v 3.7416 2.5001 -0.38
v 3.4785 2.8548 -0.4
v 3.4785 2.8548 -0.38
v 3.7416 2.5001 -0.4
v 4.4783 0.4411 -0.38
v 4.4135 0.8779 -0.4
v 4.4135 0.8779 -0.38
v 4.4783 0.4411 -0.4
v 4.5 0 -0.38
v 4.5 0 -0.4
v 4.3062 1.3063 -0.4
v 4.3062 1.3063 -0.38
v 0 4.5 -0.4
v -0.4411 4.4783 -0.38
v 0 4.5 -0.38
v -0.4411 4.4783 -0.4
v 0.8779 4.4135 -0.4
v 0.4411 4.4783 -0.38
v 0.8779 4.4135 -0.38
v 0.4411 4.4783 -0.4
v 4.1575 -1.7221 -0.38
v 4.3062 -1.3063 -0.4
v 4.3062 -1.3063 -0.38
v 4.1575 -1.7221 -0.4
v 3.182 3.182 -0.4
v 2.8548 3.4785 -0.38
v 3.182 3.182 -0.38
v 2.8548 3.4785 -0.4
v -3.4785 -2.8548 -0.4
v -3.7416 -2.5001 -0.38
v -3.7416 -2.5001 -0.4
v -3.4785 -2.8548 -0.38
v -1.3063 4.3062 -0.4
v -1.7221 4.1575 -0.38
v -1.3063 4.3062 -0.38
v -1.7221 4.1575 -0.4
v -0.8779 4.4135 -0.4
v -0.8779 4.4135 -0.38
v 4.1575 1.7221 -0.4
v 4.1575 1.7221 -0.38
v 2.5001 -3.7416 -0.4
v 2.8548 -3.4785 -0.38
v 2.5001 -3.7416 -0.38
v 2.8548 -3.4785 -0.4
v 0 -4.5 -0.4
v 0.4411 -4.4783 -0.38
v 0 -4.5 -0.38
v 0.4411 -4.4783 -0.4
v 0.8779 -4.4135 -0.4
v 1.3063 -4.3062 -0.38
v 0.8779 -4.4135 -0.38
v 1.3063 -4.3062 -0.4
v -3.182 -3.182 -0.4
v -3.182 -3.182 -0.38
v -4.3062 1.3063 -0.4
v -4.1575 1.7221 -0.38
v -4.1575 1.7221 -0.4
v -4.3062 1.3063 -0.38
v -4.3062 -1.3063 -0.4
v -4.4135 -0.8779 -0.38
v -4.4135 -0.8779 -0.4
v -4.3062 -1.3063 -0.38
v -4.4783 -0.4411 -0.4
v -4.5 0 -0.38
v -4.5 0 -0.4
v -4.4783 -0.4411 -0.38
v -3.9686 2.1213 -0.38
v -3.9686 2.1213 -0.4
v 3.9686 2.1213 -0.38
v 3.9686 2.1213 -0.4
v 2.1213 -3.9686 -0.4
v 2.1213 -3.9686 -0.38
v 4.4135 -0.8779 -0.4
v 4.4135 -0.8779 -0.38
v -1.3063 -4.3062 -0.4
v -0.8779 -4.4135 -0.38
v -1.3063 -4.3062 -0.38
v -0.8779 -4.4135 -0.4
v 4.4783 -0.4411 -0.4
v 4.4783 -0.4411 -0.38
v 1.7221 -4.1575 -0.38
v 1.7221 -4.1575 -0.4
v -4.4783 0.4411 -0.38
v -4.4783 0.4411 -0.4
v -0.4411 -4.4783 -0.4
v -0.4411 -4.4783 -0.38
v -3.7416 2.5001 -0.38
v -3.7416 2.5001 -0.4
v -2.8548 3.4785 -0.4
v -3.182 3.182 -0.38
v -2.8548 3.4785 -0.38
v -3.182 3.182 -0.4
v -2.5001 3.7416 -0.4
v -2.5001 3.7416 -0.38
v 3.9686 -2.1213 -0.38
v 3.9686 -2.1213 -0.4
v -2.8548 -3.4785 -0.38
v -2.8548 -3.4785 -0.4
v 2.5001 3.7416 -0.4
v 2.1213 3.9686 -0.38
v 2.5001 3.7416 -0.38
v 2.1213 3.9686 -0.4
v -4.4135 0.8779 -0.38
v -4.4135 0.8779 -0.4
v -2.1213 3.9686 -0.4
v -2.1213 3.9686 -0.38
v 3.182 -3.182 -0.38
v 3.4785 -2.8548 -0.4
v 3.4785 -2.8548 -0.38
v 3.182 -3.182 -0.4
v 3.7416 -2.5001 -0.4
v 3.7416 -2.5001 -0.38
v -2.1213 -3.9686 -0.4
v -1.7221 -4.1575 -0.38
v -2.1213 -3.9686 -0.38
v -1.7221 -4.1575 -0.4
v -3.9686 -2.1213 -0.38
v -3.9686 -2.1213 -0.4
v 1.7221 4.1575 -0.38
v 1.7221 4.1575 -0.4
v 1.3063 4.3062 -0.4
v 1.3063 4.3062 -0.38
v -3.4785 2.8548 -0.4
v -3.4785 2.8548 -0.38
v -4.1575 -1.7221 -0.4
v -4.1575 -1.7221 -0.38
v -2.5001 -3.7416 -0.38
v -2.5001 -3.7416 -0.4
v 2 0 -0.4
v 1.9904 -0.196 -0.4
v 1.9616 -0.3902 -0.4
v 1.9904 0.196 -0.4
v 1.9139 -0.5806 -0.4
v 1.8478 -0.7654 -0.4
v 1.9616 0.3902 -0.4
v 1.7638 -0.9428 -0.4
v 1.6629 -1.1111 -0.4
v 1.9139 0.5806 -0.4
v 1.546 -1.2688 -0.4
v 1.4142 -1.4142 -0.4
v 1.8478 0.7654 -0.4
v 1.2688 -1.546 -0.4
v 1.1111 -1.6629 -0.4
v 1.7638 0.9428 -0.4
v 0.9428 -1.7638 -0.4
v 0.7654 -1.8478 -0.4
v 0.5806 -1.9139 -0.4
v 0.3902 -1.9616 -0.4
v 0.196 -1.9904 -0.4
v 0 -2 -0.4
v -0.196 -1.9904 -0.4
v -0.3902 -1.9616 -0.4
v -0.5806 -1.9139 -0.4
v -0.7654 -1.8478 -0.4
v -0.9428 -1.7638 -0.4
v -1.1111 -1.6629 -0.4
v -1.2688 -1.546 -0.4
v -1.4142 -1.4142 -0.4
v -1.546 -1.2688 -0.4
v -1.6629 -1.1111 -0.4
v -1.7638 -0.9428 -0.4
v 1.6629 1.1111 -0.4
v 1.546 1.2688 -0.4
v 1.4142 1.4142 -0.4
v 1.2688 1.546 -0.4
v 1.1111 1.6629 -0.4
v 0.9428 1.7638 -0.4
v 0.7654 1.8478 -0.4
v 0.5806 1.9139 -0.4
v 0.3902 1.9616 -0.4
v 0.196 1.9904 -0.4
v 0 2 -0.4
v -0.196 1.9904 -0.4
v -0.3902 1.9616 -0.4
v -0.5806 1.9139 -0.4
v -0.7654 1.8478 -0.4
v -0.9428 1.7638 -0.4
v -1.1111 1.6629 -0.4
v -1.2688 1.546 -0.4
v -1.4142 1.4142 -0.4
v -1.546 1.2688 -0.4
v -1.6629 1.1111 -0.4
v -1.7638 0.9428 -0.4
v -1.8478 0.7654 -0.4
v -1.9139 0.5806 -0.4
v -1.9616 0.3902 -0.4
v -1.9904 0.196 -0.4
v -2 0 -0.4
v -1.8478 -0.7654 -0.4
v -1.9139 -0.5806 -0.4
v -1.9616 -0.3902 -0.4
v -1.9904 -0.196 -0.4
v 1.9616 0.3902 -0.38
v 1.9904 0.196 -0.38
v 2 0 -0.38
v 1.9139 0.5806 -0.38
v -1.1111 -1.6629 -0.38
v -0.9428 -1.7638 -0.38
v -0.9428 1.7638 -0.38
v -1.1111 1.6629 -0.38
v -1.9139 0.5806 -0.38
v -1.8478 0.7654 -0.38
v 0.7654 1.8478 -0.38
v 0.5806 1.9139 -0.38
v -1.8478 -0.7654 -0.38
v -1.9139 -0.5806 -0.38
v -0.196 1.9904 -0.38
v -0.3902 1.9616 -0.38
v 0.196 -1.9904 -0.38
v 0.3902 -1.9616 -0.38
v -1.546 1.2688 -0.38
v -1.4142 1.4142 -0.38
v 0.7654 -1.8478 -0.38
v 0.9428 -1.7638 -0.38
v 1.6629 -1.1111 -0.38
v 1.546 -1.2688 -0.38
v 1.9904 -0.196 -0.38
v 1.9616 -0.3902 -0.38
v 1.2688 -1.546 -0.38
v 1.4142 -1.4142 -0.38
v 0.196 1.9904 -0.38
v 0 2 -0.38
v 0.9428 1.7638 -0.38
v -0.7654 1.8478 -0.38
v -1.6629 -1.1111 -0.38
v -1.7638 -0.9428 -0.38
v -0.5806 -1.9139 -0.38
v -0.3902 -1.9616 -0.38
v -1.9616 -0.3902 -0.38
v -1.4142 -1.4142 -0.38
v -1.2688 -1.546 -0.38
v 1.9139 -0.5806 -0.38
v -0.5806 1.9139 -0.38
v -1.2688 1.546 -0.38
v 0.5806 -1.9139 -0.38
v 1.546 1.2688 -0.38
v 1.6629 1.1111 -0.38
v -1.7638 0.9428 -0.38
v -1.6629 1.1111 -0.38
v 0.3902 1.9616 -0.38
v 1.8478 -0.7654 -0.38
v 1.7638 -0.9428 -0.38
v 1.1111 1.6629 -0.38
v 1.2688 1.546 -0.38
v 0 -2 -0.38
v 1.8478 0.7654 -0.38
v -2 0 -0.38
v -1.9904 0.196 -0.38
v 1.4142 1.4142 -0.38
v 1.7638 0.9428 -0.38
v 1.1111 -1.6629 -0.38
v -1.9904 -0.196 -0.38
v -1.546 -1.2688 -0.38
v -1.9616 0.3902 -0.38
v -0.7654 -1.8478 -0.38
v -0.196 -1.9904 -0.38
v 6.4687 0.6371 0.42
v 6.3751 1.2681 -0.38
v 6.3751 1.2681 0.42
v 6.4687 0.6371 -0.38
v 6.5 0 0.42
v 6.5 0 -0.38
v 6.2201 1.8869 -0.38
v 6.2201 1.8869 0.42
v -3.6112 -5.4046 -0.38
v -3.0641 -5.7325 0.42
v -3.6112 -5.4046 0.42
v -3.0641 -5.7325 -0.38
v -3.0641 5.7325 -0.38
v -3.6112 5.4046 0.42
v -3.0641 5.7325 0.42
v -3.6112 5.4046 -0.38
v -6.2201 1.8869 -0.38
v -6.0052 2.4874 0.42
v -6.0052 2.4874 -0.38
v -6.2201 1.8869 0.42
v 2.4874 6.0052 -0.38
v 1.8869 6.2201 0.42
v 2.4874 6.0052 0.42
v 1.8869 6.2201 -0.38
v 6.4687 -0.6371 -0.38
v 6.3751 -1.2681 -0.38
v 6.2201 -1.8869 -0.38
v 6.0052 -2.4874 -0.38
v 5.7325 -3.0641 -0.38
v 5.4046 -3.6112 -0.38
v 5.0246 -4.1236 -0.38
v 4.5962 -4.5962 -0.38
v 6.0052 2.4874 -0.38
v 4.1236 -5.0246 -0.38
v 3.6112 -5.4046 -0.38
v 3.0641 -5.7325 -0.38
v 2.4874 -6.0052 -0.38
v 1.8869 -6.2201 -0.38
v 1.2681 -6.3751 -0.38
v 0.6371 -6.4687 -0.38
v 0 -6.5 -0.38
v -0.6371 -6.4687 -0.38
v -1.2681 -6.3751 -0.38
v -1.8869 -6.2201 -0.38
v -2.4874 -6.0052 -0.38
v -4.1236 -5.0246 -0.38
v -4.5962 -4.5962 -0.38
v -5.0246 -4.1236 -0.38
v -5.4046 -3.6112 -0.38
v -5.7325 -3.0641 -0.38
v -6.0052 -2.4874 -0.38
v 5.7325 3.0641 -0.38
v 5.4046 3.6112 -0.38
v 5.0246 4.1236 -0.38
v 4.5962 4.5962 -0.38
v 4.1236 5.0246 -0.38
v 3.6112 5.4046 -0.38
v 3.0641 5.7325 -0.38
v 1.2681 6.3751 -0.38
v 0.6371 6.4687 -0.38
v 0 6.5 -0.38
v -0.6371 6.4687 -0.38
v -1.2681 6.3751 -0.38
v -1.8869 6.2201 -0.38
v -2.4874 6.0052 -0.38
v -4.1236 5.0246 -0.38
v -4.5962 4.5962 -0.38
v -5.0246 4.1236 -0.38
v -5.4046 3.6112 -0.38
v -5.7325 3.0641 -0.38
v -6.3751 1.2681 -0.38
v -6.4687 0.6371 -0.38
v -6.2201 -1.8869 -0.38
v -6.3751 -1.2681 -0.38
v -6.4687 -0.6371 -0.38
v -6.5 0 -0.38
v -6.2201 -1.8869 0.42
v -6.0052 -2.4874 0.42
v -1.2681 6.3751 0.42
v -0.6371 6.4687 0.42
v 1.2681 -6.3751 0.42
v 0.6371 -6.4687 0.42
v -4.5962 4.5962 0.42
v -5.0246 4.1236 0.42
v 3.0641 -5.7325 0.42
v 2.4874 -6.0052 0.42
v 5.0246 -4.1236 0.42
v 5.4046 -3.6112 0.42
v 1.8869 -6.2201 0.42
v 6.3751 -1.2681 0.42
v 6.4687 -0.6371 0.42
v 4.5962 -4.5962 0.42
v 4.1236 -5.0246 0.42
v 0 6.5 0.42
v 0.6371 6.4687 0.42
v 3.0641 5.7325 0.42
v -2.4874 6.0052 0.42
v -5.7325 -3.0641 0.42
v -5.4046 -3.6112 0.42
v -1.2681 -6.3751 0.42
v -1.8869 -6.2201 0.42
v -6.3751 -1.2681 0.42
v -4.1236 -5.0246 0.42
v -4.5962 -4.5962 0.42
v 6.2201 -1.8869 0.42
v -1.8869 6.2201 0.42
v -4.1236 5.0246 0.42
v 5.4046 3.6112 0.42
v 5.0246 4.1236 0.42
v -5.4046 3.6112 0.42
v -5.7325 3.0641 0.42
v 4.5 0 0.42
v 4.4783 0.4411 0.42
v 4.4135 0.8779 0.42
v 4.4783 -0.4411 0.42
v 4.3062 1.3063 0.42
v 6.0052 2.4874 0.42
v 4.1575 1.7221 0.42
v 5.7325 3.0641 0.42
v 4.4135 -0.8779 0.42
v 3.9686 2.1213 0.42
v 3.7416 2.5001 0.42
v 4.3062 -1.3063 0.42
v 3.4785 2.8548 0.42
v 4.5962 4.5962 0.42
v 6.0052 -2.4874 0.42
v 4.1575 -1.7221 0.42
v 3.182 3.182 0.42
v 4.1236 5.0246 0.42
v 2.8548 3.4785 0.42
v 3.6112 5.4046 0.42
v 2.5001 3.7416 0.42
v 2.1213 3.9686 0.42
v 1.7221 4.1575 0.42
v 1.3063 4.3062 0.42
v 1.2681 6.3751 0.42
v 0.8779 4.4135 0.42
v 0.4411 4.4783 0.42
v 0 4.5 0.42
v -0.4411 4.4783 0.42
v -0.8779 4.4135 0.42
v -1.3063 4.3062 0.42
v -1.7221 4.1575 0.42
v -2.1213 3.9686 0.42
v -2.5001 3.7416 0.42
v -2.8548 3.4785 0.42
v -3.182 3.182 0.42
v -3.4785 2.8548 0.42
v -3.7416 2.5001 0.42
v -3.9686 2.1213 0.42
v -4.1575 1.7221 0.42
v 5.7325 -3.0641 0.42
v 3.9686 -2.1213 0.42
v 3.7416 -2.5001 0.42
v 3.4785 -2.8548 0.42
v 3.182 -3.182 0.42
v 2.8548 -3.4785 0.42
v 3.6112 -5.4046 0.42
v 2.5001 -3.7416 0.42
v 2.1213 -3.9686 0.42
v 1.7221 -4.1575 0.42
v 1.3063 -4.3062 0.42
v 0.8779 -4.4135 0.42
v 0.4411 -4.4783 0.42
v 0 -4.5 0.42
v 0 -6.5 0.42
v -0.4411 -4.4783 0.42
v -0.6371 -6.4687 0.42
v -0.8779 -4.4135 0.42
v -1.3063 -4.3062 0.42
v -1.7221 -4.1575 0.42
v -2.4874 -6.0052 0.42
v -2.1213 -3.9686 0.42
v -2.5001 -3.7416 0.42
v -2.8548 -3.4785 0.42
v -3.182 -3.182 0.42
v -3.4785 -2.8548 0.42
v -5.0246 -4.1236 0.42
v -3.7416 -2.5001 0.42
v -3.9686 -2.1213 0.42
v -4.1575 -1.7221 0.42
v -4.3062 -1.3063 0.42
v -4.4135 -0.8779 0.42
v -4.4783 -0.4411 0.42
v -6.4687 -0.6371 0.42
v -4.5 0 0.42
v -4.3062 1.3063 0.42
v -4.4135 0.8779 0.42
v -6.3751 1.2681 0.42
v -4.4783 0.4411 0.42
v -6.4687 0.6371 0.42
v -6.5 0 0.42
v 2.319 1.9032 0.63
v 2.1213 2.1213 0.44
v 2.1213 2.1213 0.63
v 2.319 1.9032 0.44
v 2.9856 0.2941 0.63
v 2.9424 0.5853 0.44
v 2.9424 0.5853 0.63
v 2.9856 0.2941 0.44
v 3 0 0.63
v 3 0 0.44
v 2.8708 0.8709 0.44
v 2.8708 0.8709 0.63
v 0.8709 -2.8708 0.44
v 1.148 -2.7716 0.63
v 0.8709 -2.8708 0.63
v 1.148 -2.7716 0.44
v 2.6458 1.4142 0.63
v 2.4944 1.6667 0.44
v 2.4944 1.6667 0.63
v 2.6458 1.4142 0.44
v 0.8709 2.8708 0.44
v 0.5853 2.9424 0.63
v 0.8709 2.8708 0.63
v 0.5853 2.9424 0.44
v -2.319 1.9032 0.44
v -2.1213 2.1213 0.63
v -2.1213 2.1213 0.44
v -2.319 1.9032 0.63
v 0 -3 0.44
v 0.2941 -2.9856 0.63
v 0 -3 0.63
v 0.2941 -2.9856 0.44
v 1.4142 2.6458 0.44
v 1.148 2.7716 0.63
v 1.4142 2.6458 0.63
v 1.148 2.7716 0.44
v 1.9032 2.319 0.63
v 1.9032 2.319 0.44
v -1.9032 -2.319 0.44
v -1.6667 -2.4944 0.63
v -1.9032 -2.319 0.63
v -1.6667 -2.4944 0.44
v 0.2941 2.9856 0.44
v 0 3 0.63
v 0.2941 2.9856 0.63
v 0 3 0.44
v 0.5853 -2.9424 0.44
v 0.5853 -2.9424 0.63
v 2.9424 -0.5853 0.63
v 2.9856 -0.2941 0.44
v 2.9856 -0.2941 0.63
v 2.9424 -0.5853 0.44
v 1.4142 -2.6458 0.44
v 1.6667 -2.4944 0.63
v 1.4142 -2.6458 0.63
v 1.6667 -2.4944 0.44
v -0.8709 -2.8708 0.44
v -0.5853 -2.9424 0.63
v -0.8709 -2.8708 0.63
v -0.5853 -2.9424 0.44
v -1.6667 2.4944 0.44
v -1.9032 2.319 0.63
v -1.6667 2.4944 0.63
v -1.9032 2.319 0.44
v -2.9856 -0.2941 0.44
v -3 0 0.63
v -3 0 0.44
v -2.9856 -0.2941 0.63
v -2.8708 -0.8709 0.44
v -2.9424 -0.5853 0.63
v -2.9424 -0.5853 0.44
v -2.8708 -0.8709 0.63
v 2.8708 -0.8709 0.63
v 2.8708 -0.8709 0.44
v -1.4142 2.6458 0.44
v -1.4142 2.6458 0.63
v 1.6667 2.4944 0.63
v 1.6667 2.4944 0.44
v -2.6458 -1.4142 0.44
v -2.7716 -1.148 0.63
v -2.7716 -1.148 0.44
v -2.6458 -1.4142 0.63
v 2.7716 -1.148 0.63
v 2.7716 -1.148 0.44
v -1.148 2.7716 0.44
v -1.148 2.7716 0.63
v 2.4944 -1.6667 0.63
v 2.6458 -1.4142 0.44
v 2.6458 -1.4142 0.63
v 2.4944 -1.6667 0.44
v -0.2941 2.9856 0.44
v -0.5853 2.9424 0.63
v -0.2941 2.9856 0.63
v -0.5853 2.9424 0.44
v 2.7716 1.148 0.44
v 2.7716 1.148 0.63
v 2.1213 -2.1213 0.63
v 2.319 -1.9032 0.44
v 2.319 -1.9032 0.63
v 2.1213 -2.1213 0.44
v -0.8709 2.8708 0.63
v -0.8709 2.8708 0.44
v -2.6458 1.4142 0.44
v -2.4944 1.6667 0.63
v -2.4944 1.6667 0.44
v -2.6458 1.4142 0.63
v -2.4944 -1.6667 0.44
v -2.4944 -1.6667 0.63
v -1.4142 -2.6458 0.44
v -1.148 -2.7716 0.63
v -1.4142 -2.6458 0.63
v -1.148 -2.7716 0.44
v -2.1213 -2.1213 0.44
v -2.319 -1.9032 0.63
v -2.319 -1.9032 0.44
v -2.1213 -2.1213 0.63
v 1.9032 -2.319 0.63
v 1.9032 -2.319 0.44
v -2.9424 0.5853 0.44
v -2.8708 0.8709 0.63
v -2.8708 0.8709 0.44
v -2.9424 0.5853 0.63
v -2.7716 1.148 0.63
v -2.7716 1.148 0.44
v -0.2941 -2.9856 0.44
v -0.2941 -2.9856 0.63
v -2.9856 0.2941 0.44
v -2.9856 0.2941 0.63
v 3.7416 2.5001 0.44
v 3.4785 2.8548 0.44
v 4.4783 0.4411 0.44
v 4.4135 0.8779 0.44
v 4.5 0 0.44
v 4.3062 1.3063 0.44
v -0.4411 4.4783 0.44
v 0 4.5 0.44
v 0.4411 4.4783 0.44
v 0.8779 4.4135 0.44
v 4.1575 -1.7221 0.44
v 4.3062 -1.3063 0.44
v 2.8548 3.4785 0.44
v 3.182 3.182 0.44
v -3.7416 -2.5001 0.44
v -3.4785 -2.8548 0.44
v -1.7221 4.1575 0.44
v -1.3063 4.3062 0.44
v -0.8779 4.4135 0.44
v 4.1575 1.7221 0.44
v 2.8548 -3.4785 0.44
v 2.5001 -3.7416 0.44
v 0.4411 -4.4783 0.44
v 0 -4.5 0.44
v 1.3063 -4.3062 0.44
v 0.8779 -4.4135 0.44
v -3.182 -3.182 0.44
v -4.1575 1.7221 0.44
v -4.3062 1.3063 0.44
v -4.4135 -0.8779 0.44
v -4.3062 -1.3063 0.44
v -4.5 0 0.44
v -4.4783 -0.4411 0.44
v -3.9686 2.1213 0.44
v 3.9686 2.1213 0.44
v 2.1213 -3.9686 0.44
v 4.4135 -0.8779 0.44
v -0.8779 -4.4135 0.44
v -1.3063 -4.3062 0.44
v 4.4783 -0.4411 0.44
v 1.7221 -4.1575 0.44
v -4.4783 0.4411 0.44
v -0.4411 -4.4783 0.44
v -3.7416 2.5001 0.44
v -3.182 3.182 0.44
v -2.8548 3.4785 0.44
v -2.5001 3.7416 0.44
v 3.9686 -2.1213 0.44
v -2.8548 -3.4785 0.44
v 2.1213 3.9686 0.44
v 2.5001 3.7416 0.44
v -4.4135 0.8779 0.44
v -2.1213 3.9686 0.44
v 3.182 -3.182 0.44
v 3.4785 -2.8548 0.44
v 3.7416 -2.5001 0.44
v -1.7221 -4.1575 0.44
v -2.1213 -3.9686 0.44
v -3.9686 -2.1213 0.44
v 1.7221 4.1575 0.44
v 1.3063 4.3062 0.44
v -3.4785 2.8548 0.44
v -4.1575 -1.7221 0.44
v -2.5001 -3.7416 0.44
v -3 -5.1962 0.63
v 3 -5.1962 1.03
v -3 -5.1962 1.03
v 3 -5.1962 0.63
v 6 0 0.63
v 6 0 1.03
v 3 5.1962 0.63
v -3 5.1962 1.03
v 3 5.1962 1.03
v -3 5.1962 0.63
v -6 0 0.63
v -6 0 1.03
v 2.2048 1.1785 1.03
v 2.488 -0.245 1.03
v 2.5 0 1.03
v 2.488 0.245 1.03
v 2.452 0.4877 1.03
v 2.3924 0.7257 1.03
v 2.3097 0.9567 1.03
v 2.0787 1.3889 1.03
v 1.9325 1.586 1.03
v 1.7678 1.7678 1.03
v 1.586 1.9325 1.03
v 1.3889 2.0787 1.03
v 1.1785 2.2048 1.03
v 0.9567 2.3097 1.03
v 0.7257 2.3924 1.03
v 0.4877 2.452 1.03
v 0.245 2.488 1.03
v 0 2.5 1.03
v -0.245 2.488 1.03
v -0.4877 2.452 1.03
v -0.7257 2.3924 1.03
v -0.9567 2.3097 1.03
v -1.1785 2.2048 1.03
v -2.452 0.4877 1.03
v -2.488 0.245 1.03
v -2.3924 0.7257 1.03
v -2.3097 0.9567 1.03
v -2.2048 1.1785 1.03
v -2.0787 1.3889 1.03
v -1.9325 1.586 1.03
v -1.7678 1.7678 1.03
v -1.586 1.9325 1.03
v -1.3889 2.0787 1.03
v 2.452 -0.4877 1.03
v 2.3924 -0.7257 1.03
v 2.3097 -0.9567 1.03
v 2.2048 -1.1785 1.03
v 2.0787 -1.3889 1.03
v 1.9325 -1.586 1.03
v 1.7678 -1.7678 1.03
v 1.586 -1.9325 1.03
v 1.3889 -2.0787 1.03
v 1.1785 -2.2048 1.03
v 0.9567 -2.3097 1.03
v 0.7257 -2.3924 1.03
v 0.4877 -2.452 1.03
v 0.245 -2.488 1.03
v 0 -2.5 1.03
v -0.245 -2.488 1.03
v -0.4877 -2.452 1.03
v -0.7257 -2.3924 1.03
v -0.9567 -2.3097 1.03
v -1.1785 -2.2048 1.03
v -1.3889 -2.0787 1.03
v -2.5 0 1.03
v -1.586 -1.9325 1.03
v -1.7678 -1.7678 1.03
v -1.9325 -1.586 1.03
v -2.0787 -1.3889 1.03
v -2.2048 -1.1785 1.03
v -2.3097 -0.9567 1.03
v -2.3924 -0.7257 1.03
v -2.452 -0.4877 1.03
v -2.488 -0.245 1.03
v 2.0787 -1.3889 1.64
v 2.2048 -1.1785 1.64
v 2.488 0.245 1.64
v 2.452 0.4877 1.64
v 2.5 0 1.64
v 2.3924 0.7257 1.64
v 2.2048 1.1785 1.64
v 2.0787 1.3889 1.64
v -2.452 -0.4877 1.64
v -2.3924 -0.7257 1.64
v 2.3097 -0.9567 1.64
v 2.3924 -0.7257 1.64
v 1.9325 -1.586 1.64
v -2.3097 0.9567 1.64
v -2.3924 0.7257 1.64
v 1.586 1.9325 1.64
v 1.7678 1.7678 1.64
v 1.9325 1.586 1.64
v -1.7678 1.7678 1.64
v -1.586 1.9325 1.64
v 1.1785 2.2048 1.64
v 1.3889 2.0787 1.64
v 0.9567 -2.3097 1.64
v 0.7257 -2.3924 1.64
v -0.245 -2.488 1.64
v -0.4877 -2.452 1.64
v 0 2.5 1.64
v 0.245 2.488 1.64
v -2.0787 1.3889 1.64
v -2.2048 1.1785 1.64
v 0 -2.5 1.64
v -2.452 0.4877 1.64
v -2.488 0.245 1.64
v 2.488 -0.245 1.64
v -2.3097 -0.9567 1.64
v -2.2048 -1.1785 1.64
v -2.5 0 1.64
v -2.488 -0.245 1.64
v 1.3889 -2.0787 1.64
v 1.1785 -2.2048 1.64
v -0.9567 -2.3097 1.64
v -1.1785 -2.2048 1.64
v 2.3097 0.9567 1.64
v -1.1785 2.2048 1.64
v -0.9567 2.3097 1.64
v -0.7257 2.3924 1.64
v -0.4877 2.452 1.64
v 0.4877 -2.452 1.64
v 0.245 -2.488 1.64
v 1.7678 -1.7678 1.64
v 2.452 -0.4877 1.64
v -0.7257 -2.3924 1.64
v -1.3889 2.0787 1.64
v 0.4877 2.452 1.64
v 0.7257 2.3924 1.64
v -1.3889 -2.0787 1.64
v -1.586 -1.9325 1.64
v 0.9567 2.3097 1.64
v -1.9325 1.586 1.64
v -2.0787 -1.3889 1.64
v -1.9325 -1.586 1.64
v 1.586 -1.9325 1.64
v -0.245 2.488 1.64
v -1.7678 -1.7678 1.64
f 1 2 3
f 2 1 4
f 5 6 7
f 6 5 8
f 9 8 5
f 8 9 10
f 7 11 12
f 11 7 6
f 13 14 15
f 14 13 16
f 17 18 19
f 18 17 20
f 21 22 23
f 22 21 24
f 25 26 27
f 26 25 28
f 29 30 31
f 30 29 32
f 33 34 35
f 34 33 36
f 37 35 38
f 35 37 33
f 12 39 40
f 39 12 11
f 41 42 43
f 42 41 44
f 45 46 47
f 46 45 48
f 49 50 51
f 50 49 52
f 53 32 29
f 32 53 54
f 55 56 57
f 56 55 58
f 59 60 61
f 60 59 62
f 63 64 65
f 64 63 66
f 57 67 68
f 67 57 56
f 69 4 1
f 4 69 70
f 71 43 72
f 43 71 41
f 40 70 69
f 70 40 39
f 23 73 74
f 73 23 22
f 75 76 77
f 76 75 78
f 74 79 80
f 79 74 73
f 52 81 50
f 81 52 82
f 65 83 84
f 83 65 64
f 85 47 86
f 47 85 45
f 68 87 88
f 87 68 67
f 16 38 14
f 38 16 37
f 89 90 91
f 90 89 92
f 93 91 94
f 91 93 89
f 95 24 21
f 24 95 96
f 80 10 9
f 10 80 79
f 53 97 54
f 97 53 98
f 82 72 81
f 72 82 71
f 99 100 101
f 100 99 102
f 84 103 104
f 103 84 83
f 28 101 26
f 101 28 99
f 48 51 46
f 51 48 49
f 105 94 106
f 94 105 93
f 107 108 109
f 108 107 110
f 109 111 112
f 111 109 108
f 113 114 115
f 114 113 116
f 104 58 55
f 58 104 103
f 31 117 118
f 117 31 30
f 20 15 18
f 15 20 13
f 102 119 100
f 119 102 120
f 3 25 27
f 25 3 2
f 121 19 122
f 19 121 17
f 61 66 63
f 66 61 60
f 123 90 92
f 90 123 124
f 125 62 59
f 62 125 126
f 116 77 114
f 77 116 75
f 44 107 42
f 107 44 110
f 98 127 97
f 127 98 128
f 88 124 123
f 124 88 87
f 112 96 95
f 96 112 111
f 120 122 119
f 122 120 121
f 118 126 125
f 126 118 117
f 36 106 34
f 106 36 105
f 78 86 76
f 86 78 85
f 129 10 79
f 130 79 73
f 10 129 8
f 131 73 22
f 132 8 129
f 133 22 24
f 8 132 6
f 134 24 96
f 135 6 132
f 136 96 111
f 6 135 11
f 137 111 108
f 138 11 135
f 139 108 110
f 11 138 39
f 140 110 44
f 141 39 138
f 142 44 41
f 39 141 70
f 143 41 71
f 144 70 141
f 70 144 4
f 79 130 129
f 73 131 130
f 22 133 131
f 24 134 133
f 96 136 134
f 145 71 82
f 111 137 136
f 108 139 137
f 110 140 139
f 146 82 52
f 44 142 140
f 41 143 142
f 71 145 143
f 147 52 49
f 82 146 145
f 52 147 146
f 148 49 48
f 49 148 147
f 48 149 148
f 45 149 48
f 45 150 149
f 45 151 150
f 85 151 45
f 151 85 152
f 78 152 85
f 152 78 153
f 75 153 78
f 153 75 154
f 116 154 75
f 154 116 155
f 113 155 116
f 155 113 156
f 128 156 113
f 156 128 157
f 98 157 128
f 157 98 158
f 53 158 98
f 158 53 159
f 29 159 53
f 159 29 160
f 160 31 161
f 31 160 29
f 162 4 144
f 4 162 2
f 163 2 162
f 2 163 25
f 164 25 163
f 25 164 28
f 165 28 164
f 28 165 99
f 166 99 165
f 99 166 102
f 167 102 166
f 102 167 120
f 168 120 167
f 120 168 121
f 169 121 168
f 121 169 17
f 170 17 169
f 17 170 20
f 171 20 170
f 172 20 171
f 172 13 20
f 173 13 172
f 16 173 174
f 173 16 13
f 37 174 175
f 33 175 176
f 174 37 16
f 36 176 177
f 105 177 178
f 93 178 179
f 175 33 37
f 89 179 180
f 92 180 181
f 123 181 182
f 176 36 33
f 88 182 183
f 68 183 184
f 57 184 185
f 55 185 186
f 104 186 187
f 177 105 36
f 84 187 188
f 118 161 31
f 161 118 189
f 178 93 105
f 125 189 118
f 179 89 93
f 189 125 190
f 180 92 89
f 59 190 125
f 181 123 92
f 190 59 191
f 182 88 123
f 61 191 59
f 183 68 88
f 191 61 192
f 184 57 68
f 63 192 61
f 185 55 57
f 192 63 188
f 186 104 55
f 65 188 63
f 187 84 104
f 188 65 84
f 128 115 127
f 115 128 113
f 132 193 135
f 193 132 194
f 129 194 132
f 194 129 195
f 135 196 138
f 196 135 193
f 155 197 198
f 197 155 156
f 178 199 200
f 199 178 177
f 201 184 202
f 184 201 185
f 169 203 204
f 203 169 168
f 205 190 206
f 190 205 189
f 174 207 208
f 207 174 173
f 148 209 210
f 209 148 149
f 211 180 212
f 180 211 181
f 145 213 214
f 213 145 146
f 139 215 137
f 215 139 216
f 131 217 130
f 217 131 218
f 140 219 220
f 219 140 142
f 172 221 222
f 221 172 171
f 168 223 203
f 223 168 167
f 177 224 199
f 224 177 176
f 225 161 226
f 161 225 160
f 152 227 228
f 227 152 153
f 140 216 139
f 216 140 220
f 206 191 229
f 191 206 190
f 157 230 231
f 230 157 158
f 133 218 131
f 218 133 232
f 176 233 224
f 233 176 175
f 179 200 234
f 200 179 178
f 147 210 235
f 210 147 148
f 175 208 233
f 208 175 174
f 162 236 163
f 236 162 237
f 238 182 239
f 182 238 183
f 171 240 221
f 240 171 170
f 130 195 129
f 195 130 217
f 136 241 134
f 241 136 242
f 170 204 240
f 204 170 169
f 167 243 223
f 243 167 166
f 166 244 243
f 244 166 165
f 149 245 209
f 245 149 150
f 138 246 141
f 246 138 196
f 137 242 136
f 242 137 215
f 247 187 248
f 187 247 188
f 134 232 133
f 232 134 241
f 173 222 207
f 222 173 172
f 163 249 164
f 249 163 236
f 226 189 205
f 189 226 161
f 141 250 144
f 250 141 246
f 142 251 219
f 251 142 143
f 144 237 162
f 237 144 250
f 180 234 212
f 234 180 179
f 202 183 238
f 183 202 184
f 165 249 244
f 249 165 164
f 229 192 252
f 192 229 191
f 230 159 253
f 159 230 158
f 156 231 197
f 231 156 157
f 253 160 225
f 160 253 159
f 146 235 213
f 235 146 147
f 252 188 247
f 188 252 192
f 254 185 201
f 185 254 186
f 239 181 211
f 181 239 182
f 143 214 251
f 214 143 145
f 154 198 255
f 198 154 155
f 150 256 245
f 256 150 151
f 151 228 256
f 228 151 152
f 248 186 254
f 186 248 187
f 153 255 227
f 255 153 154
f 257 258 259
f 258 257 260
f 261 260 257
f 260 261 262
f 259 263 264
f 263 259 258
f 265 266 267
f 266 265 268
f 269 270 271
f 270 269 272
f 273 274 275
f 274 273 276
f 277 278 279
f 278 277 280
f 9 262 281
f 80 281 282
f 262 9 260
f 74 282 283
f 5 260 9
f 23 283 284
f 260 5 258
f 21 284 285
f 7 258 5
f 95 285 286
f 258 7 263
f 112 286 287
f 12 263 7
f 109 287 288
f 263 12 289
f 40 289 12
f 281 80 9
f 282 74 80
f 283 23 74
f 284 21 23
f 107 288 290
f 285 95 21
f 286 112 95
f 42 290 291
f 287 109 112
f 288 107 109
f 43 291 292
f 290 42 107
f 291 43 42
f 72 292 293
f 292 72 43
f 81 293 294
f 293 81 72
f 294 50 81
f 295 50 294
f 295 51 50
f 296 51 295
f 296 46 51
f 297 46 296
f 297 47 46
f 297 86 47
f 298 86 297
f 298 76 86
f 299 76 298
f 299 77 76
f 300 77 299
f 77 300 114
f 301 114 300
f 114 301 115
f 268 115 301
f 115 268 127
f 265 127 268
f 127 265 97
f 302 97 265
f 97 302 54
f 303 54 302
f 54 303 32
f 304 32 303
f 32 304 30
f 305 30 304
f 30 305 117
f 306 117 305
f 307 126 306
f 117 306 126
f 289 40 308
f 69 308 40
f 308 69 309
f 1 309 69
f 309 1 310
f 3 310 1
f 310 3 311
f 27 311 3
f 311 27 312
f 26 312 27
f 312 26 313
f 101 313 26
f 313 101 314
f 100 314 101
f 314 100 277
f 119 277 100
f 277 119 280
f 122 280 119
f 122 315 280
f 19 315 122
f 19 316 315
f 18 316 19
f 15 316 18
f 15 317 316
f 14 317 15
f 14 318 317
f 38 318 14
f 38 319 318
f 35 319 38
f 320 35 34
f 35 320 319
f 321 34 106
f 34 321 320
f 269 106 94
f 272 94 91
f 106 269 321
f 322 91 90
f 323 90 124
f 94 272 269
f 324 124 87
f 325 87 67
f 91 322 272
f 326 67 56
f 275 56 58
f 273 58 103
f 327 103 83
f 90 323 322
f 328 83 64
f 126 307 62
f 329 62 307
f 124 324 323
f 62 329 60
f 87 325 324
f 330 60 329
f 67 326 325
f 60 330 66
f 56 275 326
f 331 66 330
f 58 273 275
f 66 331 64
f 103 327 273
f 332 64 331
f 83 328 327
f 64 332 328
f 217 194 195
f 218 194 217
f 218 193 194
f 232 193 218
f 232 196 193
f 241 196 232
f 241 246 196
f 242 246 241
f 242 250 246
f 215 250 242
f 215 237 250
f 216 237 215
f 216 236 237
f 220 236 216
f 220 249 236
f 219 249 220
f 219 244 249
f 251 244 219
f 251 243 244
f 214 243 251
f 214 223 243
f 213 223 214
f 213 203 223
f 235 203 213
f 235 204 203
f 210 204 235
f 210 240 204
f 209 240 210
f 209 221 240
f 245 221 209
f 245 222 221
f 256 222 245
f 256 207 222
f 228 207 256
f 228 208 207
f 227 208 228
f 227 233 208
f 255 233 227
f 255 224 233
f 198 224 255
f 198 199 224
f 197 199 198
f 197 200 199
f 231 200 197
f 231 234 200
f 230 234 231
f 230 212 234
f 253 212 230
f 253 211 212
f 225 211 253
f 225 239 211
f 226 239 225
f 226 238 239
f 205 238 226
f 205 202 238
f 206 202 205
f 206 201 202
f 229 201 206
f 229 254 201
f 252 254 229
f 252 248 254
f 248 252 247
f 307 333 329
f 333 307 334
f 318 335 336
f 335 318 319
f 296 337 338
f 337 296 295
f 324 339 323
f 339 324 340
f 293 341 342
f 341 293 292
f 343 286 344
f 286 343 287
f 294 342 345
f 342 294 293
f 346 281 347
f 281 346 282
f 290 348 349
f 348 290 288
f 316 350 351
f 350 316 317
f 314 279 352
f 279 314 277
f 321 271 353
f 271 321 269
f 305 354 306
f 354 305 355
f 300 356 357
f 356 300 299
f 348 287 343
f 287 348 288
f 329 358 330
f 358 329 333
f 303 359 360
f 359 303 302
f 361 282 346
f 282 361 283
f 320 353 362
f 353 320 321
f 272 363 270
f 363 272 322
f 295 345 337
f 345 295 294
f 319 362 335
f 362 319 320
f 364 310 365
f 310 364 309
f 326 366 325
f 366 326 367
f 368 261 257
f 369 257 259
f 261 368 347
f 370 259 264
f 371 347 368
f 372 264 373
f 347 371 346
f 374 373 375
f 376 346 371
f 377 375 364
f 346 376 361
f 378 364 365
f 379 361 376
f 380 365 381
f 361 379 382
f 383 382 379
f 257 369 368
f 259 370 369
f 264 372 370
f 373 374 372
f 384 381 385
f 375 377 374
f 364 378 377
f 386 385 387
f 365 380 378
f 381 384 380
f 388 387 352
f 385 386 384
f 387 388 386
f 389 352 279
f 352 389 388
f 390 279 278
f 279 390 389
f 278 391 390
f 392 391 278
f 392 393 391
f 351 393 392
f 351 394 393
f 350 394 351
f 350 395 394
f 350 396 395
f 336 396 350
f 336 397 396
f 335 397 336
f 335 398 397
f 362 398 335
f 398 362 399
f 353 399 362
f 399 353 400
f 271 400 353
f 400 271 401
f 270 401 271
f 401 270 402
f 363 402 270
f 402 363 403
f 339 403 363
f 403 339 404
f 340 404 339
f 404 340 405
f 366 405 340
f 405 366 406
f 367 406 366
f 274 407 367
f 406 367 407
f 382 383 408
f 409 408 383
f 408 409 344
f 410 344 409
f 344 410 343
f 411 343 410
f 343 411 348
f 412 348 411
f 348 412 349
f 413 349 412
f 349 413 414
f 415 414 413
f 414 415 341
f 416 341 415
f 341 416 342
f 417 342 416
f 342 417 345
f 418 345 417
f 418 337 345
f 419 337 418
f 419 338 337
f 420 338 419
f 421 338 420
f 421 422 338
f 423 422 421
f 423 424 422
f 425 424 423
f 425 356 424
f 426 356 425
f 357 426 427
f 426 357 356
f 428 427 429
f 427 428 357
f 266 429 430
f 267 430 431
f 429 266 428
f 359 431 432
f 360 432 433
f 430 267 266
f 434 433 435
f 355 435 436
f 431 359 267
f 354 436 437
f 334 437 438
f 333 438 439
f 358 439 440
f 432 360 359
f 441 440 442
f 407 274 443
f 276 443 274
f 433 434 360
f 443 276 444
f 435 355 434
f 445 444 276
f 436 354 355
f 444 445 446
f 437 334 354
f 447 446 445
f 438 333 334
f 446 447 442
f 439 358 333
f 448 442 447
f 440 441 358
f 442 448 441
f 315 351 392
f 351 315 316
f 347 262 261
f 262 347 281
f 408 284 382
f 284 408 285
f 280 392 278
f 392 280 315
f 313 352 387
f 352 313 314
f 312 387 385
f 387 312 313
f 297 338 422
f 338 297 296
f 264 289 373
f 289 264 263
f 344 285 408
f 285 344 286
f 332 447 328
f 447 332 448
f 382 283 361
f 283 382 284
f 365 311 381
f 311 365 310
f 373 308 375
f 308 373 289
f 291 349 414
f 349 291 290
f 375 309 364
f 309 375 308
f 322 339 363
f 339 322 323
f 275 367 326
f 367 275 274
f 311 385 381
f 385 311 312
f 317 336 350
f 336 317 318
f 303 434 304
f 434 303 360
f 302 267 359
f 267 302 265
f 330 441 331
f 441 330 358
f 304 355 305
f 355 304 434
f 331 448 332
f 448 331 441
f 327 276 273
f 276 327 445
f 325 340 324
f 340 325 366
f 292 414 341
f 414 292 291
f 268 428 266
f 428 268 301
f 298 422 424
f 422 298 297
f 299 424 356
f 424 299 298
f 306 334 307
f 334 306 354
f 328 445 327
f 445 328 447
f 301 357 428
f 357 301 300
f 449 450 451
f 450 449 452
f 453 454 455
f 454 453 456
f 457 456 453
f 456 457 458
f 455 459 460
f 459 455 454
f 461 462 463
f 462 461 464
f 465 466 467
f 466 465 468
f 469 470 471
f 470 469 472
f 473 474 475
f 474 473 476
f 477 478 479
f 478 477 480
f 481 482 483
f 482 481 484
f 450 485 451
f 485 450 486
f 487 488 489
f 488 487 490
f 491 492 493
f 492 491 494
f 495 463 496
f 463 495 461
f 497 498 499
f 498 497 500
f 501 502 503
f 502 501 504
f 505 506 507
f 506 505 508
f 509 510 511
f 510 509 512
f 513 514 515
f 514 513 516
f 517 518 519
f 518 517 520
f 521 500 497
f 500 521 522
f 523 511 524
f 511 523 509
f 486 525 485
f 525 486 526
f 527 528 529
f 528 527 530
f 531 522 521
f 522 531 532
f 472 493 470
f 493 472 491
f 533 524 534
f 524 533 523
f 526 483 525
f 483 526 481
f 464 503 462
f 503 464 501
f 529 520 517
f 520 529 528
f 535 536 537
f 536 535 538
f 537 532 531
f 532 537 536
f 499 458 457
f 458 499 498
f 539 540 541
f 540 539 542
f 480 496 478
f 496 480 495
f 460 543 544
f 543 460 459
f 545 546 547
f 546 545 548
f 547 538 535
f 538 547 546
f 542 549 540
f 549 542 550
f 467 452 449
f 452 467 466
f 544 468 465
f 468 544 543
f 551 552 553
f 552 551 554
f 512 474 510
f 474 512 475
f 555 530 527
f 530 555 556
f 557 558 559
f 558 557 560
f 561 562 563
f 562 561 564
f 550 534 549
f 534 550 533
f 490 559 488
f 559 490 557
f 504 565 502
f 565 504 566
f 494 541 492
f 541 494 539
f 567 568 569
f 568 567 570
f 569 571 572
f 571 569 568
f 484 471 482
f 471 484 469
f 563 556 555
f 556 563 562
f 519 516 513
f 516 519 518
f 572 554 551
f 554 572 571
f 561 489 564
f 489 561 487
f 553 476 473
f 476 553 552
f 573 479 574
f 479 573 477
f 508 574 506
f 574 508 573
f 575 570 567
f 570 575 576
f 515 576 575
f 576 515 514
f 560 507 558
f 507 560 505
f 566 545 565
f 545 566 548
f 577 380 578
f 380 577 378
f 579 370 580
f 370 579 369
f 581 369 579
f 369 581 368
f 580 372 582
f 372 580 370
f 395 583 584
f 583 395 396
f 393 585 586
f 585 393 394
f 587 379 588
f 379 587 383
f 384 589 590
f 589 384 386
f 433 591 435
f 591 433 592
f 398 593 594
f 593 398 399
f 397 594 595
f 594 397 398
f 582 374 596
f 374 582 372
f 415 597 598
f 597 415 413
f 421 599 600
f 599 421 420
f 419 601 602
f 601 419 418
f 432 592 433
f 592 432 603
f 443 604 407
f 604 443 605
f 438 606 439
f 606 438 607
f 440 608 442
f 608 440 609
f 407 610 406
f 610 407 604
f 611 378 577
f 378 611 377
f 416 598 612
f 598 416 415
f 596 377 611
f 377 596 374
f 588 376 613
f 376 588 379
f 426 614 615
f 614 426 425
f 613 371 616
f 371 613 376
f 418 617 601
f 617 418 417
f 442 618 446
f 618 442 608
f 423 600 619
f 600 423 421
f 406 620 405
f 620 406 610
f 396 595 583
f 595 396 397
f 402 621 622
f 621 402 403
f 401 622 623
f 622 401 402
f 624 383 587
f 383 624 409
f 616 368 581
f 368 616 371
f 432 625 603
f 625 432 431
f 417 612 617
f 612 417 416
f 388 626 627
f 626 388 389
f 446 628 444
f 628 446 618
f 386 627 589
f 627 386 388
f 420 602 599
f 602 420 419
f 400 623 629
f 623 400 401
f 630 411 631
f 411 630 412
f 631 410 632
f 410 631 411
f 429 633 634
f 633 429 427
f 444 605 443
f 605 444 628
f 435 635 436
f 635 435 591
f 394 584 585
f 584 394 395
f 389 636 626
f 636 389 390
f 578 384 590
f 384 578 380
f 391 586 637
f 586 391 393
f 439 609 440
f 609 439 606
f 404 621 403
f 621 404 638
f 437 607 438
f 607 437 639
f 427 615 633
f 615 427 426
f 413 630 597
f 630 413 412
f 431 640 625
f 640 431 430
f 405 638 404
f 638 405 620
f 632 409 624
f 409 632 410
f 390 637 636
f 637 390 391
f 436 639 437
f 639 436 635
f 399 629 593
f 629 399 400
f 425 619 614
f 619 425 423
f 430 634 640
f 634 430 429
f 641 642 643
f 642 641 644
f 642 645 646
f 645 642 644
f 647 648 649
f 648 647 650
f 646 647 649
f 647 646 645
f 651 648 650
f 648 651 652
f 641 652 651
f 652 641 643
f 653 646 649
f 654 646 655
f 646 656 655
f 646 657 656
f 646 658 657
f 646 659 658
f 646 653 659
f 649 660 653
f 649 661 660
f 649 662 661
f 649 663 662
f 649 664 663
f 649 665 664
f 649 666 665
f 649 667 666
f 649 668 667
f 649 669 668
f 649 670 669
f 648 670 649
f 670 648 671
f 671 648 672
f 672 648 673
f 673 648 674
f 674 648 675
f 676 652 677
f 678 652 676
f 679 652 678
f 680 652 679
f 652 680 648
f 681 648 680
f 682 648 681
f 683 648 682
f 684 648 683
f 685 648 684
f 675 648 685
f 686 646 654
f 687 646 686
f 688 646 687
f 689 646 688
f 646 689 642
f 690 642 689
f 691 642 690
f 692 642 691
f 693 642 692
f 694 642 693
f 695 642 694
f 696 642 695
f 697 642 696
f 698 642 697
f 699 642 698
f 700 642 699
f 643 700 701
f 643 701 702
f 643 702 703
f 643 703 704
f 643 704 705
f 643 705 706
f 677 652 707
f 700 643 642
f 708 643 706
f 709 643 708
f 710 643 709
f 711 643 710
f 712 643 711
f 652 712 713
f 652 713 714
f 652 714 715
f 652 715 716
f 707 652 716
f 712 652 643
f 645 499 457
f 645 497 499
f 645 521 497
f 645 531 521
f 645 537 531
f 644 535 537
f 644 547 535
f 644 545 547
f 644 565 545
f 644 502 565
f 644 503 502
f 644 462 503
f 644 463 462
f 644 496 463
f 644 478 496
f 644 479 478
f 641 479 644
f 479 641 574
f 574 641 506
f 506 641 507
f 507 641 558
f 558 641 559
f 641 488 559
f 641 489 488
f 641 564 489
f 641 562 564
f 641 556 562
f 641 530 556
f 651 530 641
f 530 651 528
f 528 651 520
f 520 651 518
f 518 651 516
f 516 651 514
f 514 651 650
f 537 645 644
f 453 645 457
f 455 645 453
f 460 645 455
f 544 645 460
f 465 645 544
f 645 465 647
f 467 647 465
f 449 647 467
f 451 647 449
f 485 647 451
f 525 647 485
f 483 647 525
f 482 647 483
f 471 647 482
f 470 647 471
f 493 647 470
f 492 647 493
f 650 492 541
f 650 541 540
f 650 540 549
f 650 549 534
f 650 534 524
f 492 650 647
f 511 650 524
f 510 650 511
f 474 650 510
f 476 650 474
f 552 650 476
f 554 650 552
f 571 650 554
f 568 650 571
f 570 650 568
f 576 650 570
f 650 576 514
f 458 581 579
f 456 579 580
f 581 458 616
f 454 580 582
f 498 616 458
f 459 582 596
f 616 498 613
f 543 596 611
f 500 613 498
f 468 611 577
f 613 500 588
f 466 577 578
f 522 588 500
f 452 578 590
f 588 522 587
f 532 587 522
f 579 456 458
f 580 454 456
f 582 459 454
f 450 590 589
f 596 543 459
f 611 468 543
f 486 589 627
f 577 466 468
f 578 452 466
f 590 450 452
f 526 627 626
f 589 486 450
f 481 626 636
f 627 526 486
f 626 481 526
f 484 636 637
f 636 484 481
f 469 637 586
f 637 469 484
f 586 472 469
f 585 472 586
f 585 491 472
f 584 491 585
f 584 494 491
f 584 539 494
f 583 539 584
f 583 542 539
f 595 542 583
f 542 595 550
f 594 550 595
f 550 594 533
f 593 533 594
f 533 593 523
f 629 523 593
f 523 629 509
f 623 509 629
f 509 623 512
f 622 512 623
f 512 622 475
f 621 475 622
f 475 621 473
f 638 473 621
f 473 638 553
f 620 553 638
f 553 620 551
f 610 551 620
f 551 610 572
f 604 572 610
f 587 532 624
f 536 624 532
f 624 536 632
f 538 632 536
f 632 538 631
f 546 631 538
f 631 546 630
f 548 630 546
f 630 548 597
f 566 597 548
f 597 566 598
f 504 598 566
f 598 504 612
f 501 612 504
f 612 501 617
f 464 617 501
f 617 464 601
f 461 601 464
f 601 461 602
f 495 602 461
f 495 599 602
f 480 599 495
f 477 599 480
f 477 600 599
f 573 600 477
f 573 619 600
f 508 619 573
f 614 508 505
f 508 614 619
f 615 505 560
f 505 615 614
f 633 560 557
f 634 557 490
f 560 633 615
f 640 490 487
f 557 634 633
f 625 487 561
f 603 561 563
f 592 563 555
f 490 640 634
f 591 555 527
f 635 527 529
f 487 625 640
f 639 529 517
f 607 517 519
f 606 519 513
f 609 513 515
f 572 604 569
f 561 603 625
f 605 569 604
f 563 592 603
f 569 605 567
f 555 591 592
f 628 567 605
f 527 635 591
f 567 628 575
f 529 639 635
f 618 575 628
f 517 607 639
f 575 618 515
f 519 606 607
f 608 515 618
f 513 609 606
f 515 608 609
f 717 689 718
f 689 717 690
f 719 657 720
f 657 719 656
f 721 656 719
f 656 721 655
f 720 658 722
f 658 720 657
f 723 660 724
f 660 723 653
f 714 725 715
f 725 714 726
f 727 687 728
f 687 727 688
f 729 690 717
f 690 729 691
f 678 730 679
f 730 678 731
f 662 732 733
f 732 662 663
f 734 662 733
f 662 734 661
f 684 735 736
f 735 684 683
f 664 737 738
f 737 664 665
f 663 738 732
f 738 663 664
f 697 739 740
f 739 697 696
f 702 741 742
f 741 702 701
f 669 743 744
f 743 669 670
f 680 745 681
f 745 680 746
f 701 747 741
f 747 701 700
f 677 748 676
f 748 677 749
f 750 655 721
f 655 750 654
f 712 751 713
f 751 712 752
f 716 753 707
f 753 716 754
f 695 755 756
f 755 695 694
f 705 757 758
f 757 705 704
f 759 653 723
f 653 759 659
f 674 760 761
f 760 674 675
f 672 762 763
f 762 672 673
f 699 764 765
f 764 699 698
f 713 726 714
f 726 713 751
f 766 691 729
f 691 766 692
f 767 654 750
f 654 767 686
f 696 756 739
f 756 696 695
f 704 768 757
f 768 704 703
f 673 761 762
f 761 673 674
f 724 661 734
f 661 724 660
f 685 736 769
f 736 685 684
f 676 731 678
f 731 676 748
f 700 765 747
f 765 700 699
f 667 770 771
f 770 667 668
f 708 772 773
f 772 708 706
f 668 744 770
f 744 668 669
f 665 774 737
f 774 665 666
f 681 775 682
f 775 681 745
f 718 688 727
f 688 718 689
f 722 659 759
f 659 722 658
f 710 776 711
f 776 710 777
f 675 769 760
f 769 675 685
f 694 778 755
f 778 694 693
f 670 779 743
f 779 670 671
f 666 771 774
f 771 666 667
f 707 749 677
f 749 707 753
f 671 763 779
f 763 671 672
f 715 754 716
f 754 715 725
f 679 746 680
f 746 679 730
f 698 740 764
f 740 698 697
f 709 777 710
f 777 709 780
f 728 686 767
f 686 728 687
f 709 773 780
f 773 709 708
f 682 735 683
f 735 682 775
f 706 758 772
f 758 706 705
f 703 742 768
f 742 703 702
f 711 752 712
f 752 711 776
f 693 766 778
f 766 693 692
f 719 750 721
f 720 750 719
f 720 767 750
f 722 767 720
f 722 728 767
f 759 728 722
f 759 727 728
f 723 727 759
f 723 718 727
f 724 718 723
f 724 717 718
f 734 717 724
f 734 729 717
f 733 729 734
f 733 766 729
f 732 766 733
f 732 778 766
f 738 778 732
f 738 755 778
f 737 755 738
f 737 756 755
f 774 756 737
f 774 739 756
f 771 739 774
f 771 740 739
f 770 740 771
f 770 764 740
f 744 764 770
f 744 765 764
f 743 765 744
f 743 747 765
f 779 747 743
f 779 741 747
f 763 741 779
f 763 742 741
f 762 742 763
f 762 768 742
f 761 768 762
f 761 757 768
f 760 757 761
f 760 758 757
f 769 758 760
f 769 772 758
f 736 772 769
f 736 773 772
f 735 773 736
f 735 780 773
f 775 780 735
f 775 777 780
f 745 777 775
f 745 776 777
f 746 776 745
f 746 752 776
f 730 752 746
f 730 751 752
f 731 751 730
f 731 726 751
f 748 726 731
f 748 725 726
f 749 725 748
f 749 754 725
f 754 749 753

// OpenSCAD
// Parameters
inner_diameter_mm = 4.0; //[2.0:8.0:0.1]
outer_diameter_mm = 9.0; //[5.0:18.0:0.1]
thickness_mm      = 0.8; //[0.4:1.6:0.05]
eps_mm            = 0.2; //[0.05:0.5:0.05]

// Connectivity overlap (requested 1–2mm)
overlap_mm = 1.2;

// Washer - base geometry
module washer(h=thickness_mm, r_out=outer_diameter_mm/2, r_in=inner_diameter_mm/2) {
  difference() {
    cylinder(r=r_out, h=h, center=true, $fn=64);
    cylinder(r=r_in,  h=h + 2*eps_mm, center=true, $fn=64);
  }
}

// Round Grommet Top - detailed geometry (kept, but will be unioned/overlapped)
module round_grommet_top() {
  cylinder(r=outer_diameter_mm/2 + 1, h=thickness_mm/2, center=true, $fn=64);
  translate([0, 0, thickness_mm/4])
    cylinder(r=inner_diameter_mm/2 + 0.5, h=thickness_mm/2, center=true, $fn=64);
}

// Round Grommet Assembly - detailed geometry (kept, but will be unioned/overlapped)
module round_grommet_assembly() {
  cylinder(r=outer_diameter_mm/2 + 2, h=thickness_mm, center=true, $fn=64);
  translate([0, 0, thickness_mm/2])
    cylinder(r=inner_diameter_mm/2 + 1, h=thickness_mm, center=true, $fn=64);
}

// Nut And Washer - detailed geometry (kept, but will be unioned/overlapped)
module nut_and_washer() {
  translate([0, 0, thickness_mm])
    cylinder(r=outer_diameter_mm/2 + 1.5, h=thickness_mm/2, center=true, $fn=6);
  washer();
}

// Screw And Washer - detailed geometry (kept, but will be unioned/overlapped)
module screw_and_washer() {
  translate([0, 0, thickness_mm])
    cylinder(r=inner_diameter_mm/2 + 0.5, h=thickness_mm * 2, center=true, $fn=64);
  washer();
}

// Assembly: FIXED connectivity
// Key fix: clamp overlap so it can never exceed the smallest adjacent half-height.
// This prevents "negative stacking" that can make the blue ring appear as a separate band/layer.
module assembly() {
  // Heights of each stacked component (as defined in modules)
  h0 = thickness_mm;        // washer()
  h1 = thickness_mm/2;      // round_grommet_top() main ring height
  h2 = thickness_mm;        // round_grommet_assembly() main ring height
  h3 = thickness_mm/2;      // nut hex plate height (nut_and_washer overall includes washer too)
  h4 = thickness_mm*2;      // screw central cylinder height (screw_and_washer overall includes washer too)

  // Safe overlap per interface: must be < (hA/2 + hB/2)
  function safe_ov(hA, hB) = min(overlap_mm, (hA + hB)/2 - 0.01);

  z0 = 0;

  ov01 = safe_ov(h0, h1);
  z1   = z0 + (h0/2 + h1/2 - ov01);

  ov12 = safe_ov(h1, h2);
  z2   = z1 + (h1/2 + h2/2 - ov12);

  ov23 = safe_ov(h2, h3);
  z3   = z2 + (h2/2 + h3/2 - ov23);

  ov34 = safe_ov(h3, h4);
  z4   = z3 + (h3/2 + h4/2 - ov34);

  union() {
    // Base washer
    color("DimGray") translate([0,0,z0]) washer();

    // Blue ring layer: now guaranteed to INTERSECT the base washer (no floating/disconnected band)
    color("RoyalBlue") translate([0,0,z1]) round_grommet_top();

    // Thicker gray ring attached via safe overlap
    color("DimGray") translate([0,0,z2]) round_grommet_assembly();

    // Nut plate + washer attached via safe overlap
    color("Black") translate([0,0,z3]) nut_and_washer();

    // Central cylinder + washer attached via safe overlap
    color("Silver") translate([0,0,z4]) screw_and_washer();
  }
}

assembly();
